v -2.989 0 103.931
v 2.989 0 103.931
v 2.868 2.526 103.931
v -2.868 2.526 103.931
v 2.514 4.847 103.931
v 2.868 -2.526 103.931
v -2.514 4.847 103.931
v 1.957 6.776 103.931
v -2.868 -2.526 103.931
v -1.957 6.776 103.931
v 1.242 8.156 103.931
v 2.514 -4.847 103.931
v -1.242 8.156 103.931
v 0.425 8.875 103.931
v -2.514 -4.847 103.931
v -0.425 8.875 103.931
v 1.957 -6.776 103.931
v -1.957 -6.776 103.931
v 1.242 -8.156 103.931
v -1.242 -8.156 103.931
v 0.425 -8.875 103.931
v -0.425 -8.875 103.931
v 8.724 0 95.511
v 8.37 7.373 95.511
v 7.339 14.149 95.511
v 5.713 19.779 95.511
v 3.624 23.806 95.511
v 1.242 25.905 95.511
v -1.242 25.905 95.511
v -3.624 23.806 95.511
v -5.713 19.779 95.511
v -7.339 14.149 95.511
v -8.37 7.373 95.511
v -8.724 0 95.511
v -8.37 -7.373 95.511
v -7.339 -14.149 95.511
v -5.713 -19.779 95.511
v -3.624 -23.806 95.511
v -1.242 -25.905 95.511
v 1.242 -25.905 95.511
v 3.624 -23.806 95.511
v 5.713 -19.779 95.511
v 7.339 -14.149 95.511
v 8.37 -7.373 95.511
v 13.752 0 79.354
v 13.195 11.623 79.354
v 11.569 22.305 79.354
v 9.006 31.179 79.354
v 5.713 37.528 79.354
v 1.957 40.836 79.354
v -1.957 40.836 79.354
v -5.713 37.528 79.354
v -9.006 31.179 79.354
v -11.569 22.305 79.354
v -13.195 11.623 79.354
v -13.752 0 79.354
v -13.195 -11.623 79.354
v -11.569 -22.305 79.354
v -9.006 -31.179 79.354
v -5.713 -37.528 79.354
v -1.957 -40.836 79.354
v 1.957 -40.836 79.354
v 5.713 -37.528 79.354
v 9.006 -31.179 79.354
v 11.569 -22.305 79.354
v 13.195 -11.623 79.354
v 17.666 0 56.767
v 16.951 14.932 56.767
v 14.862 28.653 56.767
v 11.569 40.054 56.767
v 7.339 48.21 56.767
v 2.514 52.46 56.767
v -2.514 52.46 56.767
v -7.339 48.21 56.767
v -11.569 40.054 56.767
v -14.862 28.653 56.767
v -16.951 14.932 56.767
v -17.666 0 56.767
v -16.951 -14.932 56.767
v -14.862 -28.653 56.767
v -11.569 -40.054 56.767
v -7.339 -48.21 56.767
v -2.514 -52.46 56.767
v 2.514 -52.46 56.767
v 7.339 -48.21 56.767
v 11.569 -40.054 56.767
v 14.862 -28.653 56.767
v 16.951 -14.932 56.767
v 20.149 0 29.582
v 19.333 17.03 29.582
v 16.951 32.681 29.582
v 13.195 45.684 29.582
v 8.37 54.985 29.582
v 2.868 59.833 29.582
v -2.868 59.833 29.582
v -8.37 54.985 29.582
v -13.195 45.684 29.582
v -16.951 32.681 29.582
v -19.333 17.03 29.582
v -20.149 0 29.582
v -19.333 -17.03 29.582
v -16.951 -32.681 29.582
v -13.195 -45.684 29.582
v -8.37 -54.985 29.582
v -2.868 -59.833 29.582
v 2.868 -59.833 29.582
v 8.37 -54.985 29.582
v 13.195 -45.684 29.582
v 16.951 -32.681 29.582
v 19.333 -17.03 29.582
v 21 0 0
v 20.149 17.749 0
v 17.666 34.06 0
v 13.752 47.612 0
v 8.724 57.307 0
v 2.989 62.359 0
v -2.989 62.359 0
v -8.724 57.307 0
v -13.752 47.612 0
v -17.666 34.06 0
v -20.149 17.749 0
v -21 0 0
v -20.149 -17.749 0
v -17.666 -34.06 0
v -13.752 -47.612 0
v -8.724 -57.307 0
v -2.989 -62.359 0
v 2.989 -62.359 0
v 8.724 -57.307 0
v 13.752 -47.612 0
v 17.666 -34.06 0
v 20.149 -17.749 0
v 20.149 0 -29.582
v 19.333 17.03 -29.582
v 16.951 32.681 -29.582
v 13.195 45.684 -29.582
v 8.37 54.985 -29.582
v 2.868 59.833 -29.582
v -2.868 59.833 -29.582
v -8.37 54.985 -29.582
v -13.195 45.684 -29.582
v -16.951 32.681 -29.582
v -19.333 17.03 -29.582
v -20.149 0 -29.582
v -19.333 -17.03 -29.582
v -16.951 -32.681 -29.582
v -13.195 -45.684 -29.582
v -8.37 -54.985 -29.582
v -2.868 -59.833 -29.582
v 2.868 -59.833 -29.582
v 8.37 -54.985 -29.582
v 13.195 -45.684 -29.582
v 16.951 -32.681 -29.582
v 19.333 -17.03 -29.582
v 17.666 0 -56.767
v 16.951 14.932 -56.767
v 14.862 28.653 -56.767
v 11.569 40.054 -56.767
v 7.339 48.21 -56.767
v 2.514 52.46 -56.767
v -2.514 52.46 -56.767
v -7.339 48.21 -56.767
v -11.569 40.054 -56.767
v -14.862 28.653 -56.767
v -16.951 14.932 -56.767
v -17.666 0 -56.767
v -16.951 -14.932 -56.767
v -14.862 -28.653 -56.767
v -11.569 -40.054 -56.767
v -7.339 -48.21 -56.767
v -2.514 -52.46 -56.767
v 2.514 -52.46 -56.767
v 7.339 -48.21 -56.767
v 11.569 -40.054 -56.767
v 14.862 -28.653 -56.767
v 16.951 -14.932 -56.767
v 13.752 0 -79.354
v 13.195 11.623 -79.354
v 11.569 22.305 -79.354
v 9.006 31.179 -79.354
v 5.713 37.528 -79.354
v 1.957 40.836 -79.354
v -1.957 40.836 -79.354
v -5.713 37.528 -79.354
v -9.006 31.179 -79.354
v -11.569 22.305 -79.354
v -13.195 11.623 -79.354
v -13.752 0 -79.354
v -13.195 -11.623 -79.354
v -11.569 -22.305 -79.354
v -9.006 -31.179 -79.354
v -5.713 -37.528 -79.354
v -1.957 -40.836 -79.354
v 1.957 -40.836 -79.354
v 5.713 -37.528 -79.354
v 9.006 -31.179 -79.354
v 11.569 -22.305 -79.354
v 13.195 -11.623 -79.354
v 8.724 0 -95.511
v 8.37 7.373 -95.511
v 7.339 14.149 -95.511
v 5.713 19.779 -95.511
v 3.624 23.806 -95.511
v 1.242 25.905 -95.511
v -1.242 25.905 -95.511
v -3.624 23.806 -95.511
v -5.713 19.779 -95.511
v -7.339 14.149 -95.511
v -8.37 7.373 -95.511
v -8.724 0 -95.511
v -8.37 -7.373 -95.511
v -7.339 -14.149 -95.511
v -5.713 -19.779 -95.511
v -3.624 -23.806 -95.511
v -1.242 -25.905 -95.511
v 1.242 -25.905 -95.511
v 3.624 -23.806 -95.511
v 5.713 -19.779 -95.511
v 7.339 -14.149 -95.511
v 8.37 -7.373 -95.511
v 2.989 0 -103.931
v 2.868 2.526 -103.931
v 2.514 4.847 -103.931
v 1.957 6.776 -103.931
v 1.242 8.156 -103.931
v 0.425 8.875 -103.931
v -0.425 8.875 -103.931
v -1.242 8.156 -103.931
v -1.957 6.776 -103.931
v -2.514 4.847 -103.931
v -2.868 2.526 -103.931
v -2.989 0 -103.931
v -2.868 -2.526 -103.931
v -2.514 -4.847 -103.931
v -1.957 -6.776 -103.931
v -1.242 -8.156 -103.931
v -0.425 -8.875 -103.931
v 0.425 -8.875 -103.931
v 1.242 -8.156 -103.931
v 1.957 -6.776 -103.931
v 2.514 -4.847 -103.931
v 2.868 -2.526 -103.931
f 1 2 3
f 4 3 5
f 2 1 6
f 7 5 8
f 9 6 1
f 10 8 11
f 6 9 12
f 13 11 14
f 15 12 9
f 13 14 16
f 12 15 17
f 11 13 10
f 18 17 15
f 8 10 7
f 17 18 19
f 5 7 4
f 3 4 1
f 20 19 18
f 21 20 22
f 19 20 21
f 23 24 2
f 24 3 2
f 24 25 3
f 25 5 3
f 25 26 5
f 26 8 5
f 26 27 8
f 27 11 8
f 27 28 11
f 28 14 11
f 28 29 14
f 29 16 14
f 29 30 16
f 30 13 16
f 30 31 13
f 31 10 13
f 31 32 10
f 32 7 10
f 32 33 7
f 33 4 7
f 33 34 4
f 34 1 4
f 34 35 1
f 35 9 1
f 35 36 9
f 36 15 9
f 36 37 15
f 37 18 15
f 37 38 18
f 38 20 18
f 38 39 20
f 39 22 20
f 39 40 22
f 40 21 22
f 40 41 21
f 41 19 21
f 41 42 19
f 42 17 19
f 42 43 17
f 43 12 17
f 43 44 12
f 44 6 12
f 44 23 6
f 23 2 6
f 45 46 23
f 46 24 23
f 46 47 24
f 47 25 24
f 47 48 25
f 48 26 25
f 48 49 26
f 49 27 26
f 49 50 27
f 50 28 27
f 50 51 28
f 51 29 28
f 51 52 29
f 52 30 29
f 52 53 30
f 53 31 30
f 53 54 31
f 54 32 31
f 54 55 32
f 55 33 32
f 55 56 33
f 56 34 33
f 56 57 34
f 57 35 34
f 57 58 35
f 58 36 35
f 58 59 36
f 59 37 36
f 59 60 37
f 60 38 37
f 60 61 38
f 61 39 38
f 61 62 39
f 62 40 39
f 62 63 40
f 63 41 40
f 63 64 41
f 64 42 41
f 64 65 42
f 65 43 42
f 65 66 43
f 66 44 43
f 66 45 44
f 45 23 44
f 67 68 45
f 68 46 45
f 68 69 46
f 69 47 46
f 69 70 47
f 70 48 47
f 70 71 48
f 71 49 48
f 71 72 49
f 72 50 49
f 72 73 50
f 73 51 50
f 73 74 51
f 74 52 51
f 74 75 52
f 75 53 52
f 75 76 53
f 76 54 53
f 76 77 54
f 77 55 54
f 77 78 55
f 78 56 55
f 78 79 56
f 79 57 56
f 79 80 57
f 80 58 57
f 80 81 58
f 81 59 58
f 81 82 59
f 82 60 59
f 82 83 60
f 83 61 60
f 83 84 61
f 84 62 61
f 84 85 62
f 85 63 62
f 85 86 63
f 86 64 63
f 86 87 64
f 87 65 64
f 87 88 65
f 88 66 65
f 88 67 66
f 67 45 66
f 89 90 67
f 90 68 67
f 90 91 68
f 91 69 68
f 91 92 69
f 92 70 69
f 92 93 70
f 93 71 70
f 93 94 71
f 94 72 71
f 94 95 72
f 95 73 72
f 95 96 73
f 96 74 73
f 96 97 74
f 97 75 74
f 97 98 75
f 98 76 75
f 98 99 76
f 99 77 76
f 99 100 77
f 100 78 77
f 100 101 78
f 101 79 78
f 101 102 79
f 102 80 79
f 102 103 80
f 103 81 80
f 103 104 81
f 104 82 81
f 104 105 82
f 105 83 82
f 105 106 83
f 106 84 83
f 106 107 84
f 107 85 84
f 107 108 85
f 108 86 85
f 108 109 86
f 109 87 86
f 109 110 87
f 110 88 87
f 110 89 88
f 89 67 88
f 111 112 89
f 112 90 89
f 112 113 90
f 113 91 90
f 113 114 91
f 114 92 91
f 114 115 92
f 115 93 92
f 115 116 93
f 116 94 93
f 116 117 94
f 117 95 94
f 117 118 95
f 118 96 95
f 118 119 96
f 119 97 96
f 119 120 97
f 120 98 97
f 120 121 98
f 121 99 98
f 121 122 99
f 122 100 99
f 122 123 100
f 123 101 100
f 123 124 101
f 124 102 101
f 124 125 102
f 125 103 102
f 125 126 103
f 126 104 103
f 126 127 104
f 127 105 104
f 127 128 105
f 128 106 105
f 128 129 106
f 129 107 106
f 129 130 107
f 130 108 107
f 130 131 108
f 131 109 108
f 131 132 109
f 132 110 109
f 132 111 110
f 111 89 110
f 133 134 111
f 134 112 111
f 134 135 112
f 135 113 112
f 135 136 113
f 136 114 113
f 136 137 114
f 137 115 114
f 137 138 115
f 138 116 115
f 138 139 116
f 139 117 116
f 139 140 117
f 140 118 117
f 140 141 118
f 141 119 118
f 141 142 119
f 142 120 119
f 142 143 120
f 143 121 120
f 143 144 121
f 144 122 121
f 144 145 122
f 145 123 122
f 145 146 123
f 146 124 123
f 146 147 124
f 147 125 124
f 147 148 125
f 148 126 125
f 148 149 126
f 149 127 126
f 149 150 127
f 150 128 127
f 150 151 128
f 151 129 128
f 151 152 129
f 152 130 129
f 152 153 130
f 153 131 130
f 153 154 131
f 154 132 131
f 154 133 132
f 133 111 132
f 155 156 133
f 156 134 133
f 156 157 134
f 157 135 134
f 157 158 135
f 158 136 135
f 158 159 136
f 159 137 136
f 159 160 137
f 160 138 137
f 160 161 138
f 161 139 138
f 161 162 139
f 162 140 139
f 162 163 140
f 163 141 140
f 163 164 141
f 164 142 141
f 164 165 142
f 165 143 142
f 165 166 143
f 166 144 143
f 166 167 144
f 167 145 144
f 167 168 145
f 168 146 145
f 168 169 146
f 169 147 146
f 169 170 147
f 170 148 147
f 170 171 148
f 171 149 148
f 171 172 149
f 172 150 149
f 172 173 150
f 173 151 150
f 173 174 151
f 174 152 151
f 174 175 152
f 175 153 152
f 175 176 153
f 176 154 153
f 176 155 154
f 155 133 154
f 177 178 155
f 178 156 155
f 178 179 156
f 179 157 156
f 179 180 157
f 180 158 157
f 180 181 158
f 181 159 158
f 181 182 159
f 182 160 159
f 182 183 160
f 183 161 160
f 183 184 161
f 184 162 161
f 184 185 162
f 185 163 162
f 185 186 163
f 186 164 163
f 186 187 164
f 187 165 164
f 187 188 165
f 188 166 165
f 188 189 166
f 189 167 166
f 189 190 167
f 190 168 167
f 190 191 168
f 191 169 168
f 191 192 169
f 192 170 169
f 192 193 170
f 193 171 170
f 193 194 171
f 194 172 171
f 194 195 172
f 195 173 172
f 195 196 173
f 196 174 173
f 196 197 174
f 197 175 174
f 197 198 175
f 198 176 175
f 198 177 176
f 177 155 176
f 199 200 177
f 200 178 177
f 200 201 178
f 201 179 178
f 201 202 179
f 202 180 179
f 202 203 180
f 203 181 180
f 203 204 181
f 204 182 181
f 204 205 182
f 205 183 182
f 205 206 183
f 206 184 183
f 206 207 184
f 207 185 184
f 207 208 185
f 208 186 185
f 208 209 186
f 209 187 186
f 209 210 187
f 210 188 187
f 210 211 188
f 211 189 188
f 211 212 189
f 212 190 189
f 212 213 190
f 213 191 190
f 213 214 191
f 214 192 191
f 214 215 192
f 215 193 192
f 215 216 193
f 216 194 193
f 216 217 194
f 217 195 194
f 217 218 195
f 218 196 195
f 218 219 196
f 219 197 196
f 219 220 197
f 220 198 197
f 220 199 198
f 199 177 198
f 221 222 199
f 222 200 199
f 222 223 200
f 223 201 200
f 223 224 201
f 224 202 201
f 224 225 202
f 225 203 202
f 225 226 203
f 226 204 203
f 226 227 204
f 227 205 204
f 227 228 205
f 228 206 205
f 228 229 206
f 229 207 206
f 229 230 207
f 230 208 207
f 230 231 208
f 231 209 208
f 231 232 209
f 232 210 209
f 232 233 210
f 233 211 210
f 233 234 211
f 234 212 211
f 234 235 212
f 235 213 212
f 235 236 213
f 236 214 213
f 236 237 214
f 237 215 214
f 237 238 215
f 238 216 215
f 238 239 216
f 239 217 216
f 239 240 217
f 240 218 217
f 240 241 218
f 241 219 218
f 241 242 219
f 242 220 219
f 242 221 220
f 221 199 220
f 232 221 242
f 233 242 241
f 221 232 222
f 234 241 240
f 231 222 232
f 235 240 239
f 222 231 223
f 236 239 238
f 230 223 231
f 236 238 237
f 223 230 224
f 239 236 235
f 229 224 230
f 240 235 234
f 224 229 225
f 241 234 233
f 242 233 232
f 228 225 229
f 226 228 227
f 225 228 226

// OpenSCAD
// Generated by SolidPython 1.0.1 on 2020-07-29 00:46:45


scale(v = [3, 9, 15]) {
	sphere(r = 7);
}
/***********************************************
*********      SolidPython code:      **********
************************************************
 
# import packages: SolidPython
from solid import *
from solid.utils import *
from itertools import chain, combinations, permutations


class Resize:

    def __init__(self, scad_file):
        self.scad_file = scad_file
        #self.scad_file = import_scad(scad_file)
        # cone/cylinder param:
        self.r1 = 0
        self.r2 = 0
        self.h = 0
        # rectangular prism param:
        self.w = 0
        self.l = 0
        # ellipse param:
        self.r = 0

    # import OpenScad code (file name corresponds to shape)


    # classify shape + parameters
    def assign(self, param1, param2, param3):
        if self.scad_file == 'cone.scad':
            self.r1 = param1
            self.r2 = param2
            self.h = param3
        elif self.scad_file == 'cylinder.scad':
            self.r1 = param1
            self.r2 = param2
            self.h = param3
        elif self.scad_file == 'rectangularPrism.scad':
            self.h = param1
            self.l = param2
            self.w = param3
        else:
            self.r = param1
            self.h = param2

    # resize parameters
    def iterate(self):
        x = range(3, 20, 2)
        i = 1
        if self.scad_file == 'cone.scad':
            tempList = list(permutations(x, 2))
            for temp in tempList:
                param1 = temp[0]
                param2 = temp[1]
                filepath = 'produced_scad_files/' + 'cone' + str(param1) + '_' + str(param2) + '_' + '.scad'
                scad_render_to_file(cylinder(h=param1, r1=param2, r2=0), filepath)

        elif self.scad_file == 'cylinder.scad':
            tempList = list(permutations(x, 3))
            for temp in tempList:
                param1 = temp[0]
                param2 = temp[1]
                filepath = 'produced_scad_files/' + 'cylinder' + str(param1) + '_' + str(param2) + '_' + '.scad'
                scad_render_to_file(cylinder(h=param1, r1=param2, r2=param2), filepath)

        elif self.scad_file == 'rectangularPrism.scad':
            tempList = list(permutations(x, 3))
            for temp in tempList:
                param1 = temp[0]
                param2 = temp[1]
                param3 = temp[2]
                filepath = 'produced_scad_files/' + 'rectangularPrism' + str(param1) + '_' + str(param2) + '_' + str(
                    param3) + '.scad'
                scad_render_to_file(cube(size=(param1, param2, param3)), filepath)

        elif self.scad_file == 'ellipse.scad':
            tempList = list(permutations(x, 4))
            for temp in tempList:
                param1 = temp[0]
                param2 = temp[1]
                param3 = temp[2]
                param4 = temp[3]
                filepath = 'produced_scad_files/' + 'ellipse' + str(param1) + '_' + str(param2) + '_' + str(param3) + '_' + str(param4) + '.scad'
                scad_render_to_file(scale([param1, param2, param3])(sphere(r=param4)), filepath)

    def render_to_scadfile(self):
        scad_render_to_file(scad, 'example.scad') 
 
************************************************/
